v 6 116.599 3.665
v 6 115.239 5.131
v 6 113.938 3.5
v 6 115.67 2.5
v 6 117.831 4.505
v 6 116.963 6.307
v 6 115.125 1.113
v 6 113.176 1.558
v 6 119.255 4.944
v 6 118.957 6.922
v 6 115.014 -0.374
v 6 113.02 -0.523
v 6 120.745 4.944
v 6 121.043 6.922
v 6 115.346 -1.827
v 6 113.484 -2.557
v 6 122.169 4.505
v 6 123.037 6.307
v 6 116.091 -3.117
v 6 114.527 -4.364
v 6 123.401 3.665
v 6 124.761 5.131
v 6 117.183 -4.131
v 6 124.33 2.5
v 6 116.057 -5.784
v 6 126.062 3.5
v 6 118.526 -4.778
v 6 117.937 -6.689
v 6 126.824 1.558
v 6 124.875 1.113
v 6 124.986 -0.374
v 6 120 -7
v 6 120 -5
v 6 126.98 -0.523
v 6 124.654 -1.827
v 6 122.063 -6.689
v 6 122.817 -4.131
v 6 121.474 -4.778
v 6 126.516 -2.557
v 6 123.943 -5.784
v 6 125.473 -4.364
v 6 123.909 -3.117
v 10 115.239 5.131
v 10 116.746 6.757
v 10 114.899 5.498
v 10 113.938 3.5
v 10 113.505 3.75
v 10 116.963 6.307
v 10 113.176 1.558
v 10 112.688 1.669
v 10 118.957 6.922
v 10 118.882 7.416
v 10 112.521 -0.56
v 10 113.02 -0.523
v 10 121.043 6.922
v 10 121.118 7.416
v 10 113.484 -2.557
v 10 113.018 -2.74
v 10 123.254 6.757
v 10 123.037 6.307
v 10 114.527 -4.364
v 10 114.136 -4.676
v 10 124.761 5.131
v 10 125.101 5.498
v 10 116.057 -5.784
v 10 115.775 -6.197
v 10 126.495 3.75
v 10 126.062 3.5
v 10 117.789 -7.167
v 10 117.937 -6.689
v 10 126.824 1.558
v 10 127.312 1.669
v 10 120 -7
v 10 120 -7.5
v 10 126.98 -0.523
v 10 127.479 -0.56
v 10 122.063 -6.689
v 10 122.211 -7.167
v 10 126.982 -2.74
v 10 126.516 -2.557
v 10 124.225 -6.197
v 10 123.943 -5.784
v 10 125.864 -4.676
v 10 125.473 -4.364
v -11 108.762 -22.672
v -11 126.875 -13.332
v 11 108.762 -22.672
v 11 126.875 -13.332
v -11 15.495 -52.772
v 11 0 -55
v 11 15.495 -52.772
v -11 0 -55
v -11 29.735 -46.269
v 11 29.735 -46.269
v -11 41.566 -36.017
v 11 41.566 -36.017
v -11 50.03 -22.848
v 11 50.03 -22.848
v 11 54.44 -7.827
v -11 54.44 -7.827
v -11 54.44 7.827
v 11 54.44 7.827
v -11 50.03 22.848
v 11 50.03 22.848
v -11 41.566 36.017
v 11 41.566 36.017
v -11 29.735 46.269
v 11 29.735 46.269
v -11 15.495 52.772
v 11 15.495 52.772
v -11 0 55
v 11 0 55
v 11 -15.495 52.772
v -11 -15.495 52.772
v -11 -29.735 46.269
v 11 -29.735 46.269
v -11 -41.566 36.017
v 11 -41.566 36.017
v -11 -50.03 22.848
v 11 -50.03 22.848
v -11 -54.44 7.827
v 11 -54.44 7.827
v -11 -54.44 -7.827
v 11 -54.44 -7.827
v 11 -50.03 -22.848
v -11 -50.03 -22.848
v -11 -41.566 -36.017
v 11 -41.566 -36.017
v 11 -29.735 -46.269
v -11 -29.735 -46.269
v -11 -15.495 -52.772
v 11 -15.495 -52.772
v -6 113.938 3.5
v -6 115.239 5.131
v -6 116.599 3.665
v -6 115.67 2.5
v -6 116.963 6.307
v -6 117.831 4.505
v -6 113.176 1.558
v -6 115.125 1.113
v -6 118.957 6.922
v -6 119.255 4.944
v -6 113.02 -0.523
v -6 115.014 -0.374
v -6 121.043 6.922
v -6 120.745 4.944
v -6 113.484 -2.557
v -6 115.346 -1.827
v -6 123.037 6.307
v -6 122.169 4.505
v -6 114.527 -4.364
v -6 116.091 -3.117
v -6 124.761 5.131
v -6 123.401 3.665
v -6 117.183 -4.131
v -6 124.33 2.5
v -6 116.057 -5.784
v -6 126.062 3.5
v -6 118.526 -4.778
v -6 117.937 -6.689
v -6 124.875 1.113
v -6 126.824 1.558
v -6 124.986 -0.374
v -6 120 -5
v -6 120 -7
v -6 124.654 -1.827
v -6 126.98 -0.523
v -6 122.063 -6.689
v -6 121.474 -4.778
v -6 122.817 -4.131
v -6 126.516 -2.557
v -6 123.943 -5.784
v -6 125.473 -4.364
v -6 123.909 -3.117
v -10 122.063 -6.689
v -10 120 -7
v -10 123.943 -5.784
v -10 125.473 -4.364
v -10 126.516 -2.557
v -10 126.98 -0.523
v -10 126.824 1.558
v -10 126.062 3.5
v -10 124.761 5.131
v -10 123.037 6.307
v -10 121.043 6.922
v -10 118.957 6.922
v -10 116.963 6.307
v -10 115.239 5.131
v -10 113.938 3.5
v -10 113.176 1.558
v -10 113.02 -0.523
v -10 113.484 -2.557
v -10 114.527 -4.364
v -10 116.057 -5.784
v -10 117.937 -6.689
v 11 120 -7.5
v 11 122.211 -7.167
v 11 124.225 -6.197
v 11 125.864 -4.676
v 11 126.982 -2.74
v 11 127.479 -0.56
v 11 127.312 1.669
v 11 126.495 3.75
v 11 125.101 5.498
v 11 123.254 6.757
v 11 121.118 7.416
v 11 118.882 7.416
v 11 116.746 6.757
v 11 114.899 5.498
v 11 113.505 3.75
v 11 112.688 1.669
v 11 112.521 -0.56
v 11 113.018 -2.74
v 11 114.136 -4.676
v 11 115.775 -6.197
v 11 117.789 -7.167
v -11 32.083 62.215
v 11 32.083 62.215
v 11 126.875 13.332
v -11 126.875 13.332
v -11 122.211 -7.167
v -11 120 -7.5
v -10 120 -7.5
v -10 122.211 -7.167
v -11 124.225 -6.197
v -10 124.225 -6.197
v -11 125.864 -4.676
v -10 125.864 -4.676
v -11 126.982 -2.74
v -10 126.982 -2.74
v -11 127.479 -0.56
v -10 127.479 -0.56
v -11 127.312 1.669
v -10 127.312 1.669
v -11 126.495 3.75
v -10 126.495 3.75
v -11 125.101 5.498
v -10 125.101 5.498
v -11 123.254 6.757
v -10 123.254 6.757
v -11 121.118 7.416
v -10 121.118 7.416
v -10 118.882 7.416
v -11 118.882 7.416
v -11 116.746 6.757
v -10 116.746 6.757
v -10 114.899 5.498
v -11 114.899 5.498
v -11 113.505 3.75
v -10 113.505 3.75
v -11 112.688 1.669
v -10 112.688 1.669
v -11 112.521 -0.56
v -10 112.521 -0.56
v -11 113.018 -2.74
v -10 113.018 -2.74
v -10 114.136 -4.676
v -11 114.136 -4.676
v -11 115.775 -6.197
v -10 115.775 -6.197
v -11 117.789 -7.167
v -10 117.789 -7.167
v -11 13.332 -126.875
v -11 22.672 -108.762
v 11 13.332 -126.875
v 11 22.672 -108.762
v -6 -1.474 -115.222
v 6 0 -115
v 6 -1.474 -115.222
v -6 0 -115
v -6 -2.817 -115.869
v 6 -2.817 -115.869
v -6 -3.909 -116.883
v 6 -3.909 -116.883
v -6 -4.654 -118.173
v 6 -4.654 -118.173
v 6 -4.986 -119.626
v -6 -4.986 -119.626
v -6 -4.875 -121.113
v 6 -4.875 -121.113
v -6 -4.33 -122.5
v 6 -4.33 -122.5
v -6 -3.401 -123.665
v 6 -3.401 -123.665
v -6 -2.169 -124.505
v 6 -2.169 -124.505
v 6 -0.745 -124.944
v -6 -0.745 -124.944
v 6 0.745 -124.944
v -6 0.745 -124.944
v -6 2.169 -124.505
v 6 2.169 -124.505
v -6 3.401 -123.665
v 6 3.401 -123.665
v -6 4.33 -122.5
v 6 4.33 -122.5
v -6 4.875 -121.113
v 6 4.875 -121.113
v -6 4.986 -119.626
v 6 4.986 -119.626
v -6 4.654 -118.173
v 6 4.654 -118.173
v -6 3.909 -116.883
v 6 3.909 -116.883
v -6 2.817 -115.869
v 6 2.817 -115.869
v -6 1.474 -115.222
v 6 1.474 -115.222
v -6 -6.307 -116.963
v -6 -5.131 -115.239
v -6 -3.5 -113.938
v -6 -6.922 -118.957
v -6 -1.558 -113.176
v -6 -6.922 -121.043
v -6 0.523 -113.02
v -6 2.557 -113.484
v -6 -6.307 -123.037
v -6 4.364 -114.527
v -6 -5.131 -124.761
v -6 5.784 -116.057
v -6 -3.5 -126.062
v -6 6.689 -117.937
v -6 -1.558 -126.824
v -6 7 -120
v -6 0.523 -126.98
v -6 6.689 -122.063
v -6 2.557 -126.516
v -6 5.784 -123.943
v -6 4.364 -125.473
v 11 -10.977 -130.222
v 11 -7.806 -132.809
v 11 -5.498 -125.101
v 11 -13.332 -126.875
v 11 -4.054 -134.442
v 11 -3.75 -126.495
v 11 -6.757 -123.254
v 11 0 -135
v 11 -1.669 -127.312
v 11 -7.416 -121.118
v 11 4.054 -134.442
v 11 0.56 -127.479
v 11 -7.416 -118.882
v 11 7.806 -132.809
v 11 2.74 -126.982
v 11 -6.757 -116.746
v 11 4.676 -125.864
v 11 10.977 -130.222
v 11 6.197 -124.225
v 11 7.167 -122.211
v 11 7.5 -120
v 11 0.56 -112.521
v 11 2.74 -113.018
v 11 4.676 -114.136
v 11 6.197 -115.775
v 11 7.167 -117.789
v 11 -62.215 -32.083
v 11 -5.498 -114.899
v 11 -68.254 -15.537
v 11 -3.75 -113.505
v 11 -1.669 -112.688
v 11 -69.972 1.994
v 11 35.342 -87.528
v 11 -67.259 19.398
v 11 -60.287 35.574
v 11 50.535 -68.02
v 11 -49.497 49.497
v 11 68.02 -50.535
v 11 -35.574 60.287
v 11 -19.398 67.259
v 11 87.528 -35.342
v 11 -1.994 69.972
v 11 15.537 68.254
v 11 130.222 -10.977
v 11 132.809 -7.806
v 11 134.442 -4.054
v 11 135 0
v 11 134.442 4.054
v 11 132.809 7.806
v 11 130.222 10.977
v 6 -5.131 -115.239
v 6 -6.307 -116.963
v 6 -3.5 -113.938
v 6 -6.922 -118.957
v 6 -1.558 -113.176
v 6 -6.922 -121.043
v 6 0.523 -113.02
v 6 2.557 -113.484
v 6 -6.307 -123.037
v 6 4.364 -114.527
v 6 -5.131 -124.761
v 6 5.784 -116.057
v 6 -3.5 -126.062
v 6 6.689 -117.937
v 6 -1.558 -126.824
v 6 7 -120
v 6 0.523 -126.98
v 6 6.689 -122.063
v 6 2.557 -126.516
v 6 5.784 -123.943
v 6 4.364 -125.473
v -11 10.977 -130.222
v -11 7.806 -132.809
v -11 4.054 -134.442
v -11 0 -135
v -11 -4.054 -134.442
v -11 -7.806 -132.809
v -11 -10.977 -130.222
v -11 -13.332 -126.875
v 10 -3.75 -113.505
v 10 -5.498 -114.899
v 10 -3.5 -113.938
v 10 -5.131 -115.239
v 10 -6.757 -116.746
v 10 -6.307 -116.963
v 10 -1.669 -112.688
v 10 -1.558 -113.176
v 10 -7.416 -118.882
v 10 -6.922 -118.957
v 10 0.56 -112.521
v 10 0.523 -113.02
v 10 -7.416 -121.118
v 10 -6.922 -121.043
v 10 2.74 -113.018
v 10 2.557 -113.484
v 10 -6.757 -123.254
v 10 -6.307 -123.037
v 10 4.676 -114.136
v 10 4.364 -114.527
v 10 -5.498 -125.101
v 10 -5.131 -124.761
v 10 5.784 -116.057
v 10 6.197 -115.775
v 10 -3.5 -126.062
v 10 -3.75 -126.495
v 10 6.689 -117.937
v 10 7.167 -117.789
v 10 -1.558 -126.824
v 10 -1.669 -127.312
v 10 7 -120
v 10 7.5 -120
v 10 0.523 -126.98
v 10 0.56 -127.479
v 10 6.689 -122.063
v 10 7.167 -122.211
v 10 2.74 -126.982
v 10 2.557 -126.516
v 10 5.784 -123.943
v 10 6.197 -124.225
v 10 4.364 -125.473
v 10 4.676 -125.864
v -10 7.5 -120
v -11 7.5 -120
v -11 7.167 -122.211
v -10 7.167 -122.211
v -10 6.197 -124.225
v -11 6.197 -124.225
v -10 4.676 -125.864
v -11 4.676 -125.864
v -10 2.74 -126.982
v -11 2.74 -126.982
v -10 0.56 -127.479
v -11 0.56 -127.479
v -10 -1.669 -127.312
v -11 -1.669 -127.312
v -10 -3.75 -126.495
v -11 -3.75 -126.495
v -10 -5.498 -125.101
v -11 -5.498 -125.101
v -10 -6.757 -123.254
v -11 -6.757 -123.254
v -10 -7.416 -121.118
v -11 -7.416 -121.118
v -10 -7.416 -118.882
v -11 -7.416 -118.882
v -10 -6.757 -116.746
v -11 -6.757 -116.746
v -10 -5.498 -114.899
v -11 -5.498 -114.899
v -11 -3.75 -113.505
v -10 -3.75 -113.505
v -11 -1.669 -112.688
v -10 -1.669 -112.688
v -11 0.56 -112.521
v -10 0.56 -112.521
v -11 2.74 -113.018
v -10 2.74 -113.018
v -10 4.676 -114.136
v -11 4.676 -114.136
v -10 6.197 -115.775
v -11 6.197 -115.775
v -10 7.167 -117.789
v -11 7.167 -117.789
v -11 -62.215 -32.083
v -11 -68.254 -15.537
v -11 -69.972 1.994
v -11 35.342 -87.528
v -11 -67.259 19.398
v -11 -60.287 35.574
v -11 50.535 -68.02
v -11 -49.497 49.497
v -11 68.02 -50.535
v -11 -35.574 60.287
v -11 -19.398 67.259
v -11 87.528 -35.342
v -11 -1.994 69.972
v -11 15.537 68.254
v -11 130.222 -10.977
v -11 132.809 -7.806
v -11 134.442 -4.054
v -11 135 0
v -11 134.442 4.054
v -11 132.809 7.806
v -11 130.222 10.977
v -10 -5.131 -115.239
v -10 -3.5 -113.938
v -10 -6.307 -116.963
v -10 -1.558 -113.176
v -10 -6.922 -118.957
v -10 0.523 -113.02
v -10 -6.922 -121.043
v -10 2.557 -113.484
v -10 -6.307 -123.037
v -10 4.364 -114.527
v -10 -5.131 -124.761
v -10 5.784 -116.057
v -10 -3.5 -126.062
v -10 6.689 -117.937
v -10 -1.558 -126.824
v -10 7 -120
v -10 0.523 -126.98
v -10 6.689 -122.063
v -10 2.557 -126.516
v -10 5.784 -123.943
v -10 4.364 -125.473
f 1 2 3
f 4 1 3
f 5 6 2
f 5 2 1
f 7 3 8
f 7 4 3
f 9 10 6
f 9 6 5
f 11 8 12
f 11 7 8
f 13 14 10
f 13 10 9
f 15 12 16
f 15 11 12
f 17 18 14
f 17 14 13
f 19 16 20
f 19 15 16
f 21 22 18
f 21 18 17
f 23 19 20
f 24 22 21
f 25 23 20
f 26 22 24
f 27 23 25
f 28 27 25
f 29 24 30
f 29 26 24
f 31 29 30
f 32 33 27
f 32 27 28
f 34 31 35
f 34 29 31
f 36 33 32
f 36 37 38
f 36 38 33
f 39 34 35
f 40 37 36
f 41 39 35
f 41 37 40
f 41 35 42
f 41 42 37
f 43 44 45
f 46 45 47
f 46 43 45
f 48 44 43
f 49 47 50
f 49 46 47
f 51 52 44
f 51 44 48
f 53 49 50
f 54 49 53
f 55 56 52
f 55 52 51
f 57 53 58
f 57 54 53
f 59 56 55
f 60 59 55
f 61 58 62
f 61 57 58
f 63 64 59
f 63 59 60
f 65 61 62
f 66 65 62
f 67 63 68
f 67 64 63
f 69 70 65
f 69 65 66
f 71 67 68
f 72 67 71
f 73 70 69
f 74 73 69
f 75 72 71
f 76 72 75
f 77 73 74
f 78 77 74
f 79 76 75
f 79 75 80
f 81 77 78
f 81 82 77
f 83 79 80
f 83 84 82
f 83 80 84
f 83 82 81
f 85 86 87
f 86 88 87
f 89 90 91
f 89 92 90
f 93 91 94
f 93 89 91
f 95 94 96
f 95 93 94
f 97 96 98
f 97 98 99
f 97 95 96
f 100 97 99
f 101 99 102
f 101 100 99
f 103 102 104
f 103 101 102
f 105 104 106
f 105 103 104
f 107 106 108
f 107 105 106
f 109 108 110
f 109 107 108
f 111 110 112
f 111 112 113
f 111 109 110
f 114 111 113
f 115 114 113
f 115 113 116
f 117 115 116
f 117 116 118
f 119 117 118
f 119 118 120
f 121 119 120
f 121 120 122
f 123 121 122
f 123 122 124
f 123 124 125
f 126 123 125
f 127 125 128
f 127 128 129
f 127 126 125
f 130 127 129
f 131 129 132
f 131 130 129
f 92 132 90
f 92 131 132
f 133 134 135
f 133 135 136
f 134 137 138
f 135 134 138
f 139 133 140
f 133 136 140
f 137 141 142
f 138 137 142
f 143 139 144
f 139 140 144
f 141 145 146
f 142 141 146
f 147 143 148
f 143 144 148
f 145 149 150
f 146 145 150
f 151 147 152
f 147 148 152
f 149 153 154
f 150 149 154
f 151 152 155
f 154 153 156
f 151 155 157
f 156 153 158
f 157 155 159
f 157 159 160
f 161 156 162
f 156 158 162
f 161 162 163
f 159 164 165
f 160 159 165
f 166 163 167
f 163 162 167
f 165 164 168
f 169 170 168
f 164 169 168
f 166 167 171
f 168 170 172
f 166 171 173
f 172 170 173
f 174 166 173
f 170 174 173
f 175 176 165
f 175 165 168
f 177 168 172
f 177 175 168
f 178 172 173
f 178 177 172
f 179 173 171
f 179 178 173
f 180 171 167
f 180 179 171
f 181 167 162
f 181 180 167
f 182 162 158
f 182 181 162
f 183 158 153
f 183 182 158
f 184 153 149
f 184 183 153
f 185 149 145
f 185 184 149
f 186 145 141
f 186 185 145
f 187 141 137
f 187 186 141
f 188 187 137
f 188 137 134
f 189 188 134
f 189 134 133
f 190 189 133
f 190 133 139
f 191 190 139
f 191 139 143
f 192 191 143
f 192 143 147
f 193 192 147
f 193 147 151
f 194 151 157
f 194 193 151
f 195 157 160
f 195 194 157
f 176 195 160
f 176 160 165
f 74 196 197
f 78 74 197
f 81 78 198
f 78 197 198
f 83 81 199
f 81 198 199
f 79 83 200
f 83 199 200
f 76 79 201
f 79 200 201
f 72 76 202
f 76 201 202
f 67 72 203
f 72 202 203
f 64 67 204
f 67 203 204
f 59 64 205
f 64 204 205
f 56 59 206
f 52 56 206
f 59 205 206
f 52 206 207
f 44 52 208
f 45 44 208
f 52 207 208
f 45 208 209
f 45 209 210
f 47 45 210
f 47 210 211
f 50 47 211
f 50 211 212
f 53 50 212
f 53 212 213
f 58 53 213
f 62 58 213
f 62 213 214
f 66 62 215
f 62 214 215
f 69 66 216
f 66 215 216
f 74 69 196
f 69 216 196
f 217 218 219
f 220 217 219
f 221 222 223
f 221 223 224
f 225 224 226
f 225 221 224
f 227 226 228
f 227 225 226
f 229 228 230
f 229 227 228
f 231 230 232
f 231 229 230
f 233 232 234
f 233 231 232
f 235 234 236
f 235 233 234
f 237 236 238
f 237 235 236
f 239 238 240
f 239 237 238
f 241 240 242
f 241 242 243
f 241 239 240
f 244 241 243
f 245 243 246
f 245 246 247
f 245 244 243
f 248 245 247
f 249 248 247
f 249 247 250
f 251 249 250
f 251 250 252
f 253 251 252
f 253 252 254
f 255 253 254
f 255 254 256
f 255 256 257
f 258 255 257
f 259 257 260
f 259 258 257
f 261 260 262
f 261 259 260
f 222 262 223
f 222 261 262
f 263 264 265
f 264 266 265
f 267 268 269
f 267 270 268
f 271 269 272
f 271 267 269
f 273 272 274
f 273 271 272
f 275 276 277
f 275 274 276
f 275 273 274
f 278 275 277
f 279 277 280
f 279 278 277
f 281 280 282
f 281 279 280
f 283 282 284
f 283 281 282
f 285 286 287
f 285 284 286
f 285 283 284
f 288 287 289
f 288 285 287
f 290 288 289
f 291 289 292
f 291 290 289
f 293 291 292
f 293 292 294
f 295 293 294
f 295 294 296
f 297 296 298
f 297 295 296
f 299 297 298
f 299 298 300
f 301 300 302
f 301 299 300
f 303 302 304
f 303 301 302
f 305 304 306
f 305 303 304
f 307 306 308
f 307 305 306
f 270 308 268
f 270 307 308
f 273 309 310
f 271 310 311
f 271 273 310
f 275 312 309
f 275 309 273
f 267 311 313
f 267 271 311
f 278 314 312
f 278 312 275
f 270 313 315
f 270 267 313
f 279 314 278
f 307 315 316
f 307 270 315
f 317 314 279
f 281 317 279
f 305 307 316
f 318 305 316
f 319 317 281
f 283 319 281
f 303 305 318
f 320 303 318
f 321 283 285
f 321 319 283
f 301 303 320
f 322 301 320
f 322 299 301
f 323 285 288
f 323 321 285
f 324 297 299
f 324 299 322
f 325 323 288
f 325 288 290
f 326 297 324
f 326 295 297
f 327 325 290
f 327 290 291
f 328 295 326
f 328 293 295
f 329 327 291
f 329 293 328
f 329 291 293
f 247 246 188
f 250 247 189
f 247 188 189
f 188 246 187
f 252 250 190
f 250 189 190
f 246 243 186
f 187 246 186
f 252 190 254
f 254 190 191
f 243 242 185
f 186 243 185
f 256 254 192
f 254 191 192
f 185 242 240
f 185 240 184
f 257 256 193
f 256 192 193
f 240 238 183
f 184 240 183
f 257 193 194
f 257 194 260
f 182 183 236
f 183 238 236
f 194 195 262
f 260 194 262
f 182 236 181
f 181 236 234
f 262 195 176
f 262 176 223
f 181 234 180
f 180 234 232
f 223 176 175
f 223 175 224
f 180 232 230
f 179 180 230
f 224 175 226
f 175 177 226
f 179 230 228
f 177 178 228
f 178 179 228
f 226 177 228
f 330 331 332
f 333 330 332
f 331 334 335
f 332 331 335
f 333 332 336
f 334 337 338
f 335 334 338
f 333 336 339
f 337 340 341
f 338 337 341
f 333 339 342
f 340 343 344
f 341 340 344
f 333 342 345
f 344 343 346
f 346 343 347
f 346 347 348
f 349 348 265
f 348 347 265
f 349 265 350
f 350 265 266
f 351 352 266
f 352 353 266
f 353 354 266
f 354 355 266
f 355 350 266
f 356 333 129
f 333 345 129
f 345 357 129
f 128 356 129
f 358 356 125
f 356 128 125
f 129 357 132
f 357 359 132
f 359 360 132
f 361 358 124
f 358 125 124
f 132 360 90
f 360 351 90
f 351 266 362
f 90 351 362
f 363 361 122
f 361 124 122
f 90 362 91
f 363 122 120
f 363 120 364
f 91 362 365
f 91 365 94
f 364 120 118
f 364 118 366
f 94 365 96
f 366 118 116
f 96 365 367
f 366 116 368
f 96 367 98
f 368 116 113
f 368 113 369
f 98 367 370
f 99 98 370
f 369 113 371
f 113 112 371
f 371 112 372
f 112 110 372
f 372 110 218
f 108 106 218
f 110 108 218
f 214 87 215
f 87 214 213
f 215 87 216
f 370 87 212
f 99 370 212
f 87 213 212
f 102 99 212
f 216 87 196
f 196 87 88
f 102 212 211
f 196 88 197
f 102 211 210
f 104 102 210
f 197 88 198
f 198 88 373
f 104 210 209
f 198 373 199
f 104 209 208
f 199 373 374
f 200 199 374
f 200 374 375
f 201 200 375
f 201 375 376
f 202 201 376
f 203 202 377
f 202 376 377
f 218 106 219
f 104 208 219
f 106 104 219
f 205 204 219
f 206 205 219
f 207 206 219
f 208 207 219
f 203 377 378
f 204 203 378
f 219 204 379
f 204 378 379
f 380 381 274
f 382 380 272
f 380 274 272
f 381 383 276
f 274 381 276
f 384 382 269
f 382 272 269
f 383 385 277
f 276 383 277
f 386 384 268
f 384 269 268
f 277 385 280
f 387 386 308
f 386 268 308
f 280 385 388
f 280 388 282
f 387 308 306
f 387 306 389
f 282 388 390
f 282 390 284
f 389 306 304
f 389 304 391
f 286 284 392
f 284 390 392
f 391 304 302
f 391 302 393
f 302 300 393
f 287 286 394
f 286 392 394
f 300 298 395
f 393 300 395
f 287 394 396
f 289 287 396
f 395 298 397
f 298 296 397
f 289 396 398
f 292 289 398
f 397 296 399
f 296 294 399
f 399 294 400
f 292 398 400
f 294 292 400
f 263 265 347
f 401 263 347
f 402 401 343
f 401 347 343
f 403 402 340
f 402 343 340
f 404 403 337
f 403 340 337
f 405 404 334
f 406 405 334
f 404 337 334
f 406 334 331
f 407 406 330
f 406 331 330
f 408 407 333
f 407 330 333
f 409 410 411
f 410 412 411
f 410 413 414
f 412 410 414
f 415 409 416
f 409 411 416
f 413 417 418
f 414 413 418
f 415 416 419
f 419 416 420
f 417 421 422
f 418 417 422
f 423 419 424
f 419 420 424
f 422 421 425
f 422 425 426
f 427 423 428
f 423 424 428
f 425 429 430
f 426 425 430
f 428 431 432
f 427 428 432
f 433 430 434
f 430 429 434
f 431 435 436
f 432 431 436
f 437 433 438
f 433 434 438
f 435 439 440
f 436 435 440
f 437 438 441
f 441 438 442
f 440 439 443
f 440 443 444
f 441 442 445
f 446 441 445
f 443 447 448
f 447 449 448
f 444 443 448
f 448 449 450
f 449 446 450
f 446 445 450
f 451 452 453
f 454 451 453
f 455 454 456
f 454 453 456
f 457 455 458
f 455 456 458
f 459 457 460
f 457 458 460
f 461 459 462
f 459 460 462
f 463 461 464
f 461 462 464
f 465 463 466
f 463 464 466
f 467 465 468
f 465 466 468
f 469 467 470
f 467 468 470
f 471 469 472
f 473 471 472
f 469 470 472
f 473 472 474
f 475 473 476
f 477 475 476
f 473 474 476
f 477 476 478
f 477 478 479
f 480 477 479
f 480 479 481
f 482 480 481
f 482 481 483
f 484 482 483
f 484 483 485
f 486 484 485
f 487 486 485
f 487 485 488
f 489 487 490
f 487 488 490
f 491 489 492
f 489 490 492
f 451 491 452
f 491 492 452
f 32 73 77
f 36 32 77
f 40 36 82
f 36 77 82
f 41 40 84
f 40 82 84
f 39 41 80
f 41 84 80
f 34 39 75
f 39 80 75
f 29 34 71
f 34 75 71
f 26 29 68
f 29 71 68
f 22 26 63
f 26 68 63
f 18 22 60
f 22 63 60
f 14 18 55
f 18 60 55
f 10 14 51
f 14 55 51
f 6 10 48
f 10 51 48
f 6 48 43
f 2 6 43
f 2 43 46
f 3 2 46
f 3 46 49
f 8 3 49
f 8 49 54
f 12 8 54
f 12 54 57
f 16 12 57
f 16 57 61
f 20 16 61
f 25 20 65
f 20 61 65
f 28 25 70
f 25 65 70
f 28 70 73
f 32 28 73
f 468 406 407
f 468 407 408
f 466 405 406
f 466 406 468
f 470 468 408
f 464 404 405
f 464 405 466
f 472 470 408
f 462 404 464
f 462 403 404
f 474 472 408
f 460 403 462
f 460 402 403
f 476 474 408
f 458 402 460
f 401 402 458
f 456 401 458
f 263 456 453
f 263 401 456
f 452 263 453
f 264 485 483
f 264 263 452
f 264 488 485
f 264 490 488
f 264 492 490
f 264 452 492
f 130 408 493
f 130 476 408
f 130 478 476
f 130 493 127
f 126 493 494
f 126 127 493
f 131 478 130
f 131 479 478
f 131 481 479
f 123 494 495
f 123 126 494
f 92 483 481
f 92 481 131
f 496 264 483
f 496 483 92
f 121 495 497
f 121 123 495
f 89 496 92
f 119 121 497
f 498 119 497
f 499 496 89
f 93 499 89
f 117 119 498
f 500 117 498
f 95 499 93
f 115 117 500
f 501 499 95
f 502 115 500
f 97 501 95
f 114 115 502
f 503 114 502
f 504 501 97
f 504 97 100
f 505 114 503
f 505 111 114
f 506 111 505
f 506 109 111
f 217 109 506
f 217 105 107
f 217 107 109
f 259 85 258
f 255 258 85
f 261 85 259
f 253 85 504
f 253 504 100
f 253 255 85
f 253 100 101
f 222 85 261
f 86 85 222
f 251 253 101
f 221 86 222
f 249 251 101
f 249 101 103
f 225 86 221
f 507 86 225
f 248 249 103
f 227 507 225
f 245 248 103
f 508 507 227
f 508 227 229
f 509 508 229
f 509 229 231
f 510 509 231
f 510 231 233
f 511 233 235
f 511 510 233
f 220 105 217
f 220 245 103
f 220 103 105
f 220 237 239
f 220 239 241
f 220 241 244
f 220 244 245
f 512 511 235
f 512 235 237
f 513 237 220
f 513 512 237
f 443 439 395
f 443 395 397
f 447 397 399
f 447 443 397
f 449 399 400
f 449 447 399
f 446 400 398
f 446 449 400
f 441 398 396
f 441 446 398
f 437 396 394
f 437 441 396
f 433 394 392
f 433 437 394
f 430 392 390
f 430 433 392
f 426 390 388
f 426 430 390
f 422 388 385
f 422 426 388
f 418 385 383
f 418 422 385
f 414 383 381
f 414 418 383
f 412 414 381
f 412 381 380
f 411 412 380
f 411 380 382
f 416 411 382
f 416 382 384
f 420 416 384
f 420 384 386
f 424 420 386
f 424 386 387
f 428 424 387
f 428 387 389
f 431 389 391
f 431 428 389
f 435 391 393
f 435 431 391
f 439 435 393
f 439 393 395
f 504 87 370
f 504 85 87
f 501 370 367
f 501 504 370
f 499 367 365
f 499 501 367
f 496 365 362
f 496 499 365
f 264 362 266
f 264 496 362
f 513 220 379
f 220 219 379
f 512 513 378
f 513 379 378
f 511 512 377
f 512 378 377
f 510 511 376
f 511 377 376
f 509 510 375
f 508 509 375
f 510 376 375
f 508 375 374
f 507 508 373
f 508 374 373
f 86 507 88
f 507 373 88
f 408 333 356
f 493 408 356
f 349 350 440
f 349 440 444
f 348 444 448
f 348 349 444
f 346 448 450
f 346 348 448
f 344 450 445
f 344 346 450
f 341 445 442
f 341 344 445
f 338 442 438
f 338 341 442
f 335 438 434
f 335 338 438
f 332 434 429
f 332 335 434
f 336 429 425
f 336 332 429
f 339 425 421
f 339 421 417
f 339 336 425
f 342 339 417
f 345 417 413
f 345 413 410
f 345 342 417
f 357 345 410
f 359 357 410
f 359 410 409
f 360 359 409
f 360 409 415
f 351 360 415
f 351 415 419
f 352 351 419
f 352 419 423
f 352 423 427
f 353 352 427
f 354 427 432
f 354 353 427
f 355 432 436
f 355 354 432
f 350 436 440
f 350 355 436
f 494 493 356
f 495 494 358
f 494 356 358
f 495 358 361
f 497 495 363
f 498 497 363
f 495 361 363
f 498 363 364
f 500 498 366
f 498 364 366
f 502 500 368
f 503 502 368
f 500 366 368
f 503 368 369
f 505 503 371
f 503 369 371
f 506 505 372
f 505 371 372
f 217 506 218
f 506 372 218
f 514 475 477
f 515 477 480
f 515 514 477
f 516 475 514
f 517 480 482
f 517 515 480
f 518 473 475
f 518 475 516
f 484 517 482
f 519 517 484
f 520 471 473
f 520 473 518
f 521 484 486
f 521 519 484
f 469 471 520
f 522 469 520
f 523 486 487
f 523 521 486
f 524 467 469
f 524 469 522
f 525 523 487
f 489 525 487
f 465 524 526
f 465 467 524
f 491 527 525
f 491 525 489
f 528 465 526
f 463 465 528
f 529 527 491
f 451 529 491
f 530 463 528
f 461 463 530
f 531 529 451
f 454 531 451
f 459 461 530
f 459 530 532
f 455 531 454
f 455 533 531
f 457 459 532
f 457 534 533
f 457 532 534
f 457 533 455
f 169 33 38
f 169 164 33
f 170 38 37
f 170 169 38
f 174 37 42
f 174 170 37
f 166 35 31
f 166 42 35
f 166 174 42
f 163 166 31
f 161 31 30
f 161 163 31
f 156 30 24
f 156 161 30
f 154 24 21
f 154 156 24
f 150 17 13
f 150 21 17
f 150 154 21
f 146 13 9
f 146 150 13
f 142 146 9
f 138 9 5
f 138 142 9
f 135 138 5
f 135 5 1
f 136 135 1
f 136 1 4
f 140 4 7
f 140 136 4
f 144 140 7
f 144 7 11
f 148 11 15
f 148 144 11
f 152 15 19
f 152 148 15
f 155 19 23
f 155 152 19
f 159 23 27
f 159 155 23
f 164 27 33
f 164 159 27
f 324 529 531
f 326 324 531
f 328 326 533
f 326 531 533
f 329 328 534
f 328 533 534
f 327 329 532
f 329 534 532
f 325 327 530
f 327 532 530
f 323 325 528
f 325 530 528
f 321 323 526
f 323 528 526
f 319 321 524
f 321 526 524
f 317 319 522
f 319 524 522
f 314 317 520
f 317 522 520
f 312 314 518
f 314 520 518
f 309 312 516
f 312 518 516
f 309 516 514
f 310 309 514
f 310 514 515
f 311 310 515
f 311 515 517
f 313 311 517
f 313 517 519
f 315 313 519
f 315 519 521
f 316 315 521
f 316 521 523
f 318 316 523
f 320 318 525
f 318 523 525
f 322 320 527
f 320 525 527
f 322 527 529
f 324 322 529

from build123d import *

# Parameters (mm, degrees)
SKETCH1_R                                  = 55
SKETCH1_R_2                                = 5
BOSS_EXTRUDE1_DEPTH                        = 11
SKETCH2_R                                  = 7.5
CUT_EXTRUDE1_DEPTH                         = 1
SKETCH3_R                                  = 7
CUT_EXTRUDE2_DEPTH                         = 4
MIRROR1_AT_THE_SECOND_PLANE_COPY_1_SKETC_R = 7.5
MIRROR1_AT_THE_SECOND_PLANE_COPY_1_DEPTH   = 1
MIRROR1_AT_THE_SECOND_PLANE_COPY_2_SKETC_R = 7
MIRROR1_AT_THE_SECOND_PLANE_COPY_2_DEPTH   = 4
FILLET1_R                                  = 200


with BuildPart() as part:
    # Sketch1 → Boss-Extrude1 (new, symmetric)
    with BuildSketch(Plane(origin=(0, 0, 0), x_dir=(0, 0, -1), z_dir=(1, 0, 0))):
        with BuildLine():
            Line((-62.214626272, 32.083333333), (-13.33170563, 126.875))
            ThreePointArc((-13.33170563, 126.875), (0, 135), (13.33170563, 126.875))
            Line((13.33170563, 126.875), (51.962948302, 51.962948302))
            Line((51.962948302, 51.962948302), (126.875, 13.33170563))
            ThreePointArc((126.875, 13.33170563), (135, 0), (126.875, -13.33170563))
            Line((126.875, -13.33170563), (32.083333333, -62.214626272))
            ThreePointArc((32.083333333, -62.214626272), (-49.497474683, -49.497474683), (-62.214626272, 32.083333333))
        make_face()
        Circle(SKETCH1_R, mode=Mode.SUBTRACT)
        with Locations((0, 120)):
            Circle(SKETCH1_R_2, mode=Mode.SUBTRACT)
        with Locations((120, 0)):
            Circle(SKETCH1_R_2, mode=Mode.SUBTRACT)
    extrude(amount=BOSS_EXTRUDE1_DEPTH, both=True)

    # Sketch2 → Cut-Extrude1 (cut)
    with BuildSketch(Plane(origin=(11, 0, 0), x_dir=(0, 0, -1), z_dir=(1, 0, 0))):
        with Locations((0, 120)):
            Circle(SKETCH2_R)
    cut_extrude1 = extrude(amount=-CUT_EXTRUDE1_DEPTH, mode=Mode.SUBTRACT)

    # Sketch3 → Cut-Extrude2 (cut)
    with BuildSketch(Plane(origin=(10, 0, 0), x_dir=(0, 0, -1), z_dir=(1, 0, 0))):
        with Locations((0, 120)):
            Circle(SKETCH3_R)
    cut_extrude2 = extrude(amount=-CUT_EXTRUDE2_DEPTH, mode=Mode.SUBTRACT)

    # Mirror1: Cut-Extrude1, Cut-Extrude2 across plane
    add(cut_extrude1.mirror(Plane(origin=(0, 0, 0), x_dir=(0, -0.7071067811865464, 0.7071067811865487), z_dir=(0, -0.7071067811865487, -0.7071067811865464))), mode=Mode.SUBTRACT)
    add(cut_extrude2.mirror(Plane(origin=(0, 0, 0), x_dir=(0, -0.7071067811865464, 0.7071067811865487), z_dir=(0, -0.7071067811865487, -0.7071067811865464))), mode=Mode.SUBTRACT)

    # Mirror1 at the second plane: Cut-Extrude1, Cut-Extrude2 across plane
    add(cut_extrude1.mirror(Plane(origin=(0, 0, 0), x_dir=(0, 0, 1), z_dir=(1, 0, 0))), mode=Mode.SUBTRACT)
    add(cut_extrude2.mirror(Plane(origin=(0, 0, 0), x_dir=(0, 0, 1), z_dir=(1, 0, 0))), mode=Mode.SUBTRACT)

    # Mirror1 at the second plane copy 1 sketc → Mirror1 at the second plane copy 1 (cut)
    with BuildSketch(Plane(origin=(-11, 0, 0), x_dir=(0, 1, 0), z_dir=(-1, 0, 0))):
        with Locations((0, 120)):
            Circle(MIRROR1_AT_THE_SECOND_PLANE_COPY_1_SKETC_R)
    extrude(amount=-MIRROR1_AT_THE_SECOND_PLANE_COPY_1_DEPTH, mode=Mode.SUBTRACT)

    # Mirror1 at the second plane copy 2 sketc → Mirror1 at the second plane copy 2 (cut)
    with BuildSketch(Plane(origin=(-10, 0, 0), x_dir=(0, 1, 0), z_dir=(-1, 0, 0))):
        with Locations((0, 120)):
            Circle(MIRROR1_AT_THE_SECOND_PLANE_COPY_2_SKETC_R)
    extrude(amount=-MIRROR1_AT_THE_SECOND_PLANE_COPY_2_DEPTH, mode=Mode.SUBTRACT)

    # Fillet1
    fillet1_edges = [part.edges().sort_by_distance(p)[0] for p in [
        (0, 51.962948302, -51.962948302),
    ]]
    fillet(fillet1_edges, radius=FILLET1_R)


solid = part.part
